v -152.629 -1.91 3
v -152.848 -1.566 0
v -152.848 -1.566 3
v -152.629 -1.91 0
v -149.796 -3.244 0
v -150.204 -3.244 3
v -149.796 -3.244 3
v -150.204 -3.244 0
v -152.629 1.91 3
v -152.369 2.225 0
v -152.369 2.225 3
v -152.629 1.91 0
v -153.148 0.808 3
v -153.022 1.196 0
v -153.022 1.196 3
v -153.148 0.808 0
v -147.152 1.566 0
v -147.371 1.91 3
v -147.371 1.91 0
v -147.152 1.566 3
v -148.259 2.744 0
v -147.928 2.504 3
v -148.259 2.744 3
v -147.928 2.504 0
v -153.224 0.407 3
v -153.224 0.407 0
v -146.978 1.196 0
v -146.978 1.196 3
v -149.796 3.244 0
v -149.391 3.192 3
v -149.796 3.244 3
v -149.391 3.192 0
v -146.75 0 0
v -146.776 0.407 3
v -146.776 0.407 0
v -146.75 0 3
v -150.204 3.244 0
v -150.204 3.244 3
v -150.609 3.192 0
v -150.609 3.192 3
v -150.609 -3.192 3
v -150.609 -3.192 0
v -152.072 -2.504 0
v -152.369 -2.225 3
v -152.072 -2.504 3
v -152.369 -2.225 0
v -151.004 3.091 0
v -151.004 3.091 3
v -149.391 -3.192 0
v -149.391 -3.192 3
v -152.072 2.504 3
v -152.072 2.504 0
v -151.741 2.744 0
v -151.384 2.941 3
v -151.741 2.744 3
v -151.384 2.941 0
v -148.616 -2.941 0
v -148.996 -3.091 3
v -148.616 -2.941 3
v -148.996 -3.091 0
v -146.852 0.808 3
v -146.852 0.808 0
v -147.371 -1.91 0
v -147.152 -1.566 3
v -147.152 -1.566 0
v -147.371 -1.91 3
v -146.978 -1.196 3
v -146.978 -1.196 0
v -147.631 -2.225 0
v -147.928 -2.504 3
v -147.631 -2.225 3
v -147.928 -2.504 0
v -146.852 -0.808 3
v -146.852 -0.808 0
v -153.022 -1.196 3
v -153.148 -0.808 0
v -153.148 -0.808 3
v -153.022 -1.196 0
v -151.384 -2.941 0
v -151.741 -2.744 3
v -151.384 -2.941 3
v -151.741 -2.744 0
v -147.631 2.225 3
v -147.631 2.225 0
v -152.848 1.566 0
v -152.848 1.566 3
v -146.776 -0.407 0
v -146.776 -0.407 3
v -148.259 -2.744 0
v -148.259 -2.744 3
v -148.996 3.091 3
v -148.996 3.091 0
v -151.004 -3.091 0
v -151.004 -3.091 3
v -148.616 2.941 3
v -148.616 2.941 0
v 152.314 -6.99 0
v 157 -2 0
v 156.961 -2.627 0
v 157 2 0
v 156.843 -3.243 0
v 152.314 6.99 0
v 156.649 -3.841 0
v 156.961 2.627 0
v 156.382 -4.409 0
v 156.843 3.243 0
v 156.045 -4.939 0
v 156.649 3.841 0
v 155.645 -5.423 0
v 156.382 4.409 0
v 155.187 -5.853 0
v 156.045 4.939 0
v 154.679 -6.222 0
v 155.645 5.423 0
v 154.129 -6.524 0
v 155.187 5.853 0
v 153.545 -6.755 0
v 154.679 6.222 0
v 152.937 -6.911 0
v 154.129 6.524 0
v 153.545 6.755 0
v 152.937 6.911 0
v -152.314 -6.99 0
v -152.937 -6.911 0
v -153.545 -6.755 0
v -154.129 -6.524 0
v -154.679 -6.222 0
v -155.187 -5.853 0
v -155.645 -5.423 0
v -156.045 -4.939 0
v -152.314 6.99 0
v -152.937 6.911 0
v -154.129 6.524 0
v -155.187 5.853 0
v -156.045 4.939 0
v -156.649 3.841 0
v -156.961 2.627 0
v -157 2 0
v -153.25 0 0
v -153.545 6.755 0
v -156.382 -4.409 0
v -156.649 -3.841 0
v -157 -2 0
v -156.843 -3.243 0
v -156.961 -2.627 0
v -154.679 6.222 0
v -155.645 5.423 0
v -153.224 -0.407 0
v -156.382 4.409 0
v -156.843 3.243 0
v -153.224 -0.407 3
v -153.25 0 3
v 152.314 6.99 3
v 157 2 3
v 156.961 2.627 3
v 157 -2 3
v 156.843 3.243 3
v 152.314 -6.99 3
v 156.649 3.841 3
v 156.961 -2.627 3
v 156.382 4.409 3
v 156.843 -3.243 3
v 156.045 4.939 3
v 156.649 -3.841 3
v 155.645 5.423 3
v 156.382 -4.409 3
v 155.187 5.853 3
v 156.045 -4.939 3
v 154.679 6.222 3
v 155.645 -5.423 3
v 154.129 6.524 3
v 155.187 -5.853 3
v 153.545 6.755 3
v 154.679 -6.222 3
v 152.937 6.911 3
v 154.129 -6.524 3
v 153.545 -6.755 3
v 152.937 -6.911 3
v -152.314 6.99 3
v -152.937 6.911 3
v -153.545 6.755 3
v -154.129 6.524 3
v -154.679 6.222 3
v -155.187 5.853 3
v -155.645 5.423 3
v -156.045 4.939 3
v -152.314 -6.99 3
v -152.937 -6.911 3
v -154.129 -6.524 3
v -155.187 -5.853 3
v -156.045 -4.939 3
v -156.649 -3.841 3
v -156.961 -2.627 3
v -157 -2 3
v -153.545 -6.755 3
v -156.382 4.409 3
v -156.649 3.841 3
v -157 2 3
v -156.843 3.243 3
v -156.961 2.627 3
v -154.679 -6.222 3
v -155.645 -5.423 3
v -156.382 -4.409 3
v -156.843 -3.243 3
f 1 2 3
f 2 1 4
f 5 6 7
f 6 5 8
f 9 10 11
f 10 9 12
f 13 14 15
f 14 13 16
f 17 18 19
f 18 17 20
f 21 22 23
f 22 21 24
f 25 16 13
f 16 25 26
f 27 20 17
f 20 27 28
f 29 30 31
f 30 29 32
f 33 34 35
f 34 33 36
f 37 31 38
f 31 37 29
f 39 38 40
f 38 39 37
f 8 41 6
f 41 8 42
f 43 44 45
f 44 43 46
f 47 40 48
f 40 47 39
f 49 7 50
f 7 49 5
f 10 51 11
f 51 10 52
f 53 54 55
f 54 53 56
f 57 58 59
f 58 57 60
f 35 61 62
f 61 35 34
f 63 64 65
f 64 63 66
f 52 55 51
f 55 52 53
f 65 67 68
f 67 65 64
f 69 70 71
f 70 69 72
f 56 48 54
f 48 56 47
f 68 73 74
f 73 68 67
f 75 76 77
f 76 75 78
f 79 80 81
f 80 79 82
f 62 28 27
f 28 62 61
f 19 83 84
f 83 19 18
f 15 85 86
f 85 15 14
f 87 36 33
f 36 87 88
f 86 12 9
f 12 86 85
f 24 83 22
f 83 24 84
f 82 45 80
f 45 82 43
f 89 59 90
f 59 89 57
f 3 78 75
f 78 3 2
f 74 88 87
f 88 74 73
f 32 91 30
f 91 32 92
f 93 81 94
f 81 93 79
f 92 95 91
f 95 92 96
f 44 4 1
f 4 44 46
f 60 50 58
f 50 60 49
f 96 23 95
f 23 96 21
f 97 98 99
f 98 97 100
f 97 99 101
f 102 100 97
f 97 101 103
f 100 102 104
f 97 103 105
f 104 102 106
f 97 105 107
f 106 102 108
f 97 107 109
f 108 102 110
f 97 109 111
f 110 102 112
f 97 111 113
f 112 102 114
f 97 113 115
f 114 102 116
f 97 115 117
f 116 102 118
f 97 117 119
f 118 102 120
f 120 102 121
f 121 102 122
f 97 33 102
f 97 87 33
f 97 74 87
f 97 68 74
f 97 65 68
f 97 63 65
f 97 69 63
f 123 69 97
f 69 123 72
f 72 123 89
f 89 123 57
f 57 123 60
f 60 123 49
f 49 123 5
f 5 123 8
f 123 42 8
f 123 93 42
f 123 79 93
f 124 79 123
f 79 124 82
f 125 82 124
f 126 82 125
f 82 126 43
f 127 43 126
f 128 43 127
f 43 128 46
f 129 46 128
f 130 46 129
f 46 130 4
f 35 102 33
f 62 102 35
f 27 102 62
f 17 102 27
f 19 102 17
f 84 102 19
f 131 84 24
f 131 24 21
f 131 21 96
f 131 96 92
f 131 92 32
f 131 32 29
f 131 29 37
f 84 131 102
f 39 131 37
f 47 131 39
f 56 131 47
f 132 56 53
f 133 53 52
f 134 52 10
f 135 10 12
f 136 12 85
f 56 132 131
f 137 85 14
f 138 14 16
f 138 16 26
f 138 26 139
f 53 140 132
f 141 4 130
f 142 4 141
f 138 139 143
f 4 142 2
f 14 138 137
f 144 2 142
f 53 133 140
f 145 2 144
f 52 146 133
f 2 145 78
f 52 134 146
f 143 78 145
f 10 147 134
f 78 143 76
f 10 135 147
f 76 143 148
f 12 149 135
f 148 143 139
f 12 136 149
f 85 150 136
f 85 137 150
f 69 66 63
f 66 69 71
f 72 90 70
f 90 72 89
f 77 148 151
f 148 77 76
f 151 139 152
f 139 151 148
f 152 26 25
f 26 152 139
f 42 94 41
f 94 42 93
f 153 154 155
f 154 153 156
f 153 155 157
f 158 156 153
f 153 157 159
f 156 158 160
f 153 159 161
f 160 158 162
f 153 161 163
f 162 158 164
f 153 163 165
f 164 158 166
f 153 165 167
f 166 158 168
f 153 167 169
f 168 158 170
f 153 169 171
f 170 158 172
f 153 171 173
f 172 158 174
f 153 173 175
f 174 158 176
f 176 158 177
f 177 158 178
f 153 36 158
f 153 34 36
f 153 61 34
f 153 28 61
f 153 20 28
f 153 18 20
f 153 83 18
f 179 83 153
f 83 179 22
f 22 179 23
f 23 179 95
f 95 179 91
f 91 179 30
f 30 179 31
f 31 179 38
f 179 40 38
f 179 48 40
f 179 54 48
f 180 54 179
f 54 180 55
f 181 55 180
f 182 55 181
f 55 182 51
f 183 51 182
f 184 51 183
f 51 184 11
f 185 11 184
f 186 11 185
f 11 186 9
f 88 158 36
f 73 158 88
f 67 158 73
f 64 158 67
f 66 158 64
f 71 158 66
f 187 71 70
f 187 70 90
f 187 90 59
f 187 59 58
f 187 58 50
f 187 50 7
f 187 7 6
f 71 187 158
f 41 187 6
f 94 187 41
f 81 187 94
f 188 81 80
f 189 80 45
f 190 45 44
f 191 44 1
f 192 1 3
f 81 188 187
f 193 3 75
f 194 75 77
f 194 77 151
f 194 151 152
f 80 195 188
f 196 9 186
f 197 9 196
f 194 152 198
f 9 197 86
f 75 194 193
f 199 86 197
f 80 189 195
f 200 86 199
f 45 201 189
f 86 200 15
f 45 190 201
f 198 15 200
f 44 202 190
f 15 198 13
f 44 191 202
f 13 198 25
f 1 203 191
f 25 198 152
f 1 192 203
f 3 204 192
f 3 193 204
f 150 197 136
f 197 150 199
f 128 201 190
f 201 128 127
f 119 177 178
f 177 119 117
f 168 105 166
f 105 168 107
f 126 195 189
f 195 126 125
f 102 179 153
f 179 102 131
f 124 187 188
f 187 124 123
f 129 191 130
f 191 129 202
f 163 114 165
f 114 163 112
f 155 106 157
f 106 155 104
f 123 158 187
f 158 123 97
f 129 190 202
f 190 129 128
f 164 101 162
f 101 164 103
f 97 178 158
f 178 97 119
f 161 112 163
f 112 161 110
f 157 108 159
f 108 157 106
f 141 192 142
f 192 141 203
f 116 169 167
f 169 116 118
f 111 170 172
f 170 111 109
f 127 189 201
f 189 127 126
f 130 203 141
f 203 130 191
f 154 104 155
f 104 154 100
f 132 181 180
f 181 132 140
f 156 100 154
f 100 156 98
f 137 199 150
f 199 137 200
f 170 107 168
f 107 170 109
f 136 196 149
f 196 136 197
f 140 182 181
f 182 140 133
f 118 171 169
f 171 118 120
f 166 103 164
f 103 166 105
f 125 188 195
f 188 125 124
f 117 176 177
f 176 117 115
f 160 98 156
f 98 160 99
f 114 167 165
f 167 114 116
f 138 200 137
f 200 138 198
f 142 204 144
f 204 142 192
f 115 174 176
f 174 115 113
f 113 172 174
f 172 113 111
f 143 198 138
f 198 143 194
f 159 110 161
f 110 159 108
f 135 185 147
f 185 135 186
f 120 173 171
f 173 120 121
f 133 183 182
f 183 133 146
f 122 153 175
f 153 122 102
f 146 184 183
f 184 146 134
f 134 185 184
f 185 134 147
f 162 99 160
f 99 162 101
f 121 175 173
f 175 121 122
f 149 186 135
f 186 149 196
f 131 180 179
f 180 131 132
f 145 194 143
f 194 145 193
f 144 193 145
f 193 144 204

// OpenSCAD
$fn = 50;


difference() {
	union() {
		hull() {
			translate(v = [-152.0000000000, 2.0000000000, 0]) {
				cylinder(h = 3, r = 5);
			}
			translate(v = [152.0000000000, 2.0000000000, 0]) {
				cylinder(h = 3, r = 5);
			}
			translate(v = [-152.0000000000, -2.0000000000, 0]) {
				cylinder(h = 3, r = 5);
			}
			translate(v = [152.0000000000, -2.0000000000, 0]) {
				cylinder(h = 3, r = 5);
			}
		}
	}
	union() {
		translate(v = [-150.0000000000, 0.0000000000, 0]) {
			cylinder(h = 3, r = 3.2500000000);
		}
		translate(v = [-150.0000000000, 0.0000000000, 0]) {
			cylinder(h = 3, r = 1.8000000000);
		}
		translate(v = [-150.0000000000, 0.0000000000, 0]) {
			cylinder(h = 3, r = 1.8000000000);
		}
		translate(v = [-150.0000000000, 0.0000000000, 0]) {
			cylinder(h = 3, r = 1.8000000000);
		}
	}
}
